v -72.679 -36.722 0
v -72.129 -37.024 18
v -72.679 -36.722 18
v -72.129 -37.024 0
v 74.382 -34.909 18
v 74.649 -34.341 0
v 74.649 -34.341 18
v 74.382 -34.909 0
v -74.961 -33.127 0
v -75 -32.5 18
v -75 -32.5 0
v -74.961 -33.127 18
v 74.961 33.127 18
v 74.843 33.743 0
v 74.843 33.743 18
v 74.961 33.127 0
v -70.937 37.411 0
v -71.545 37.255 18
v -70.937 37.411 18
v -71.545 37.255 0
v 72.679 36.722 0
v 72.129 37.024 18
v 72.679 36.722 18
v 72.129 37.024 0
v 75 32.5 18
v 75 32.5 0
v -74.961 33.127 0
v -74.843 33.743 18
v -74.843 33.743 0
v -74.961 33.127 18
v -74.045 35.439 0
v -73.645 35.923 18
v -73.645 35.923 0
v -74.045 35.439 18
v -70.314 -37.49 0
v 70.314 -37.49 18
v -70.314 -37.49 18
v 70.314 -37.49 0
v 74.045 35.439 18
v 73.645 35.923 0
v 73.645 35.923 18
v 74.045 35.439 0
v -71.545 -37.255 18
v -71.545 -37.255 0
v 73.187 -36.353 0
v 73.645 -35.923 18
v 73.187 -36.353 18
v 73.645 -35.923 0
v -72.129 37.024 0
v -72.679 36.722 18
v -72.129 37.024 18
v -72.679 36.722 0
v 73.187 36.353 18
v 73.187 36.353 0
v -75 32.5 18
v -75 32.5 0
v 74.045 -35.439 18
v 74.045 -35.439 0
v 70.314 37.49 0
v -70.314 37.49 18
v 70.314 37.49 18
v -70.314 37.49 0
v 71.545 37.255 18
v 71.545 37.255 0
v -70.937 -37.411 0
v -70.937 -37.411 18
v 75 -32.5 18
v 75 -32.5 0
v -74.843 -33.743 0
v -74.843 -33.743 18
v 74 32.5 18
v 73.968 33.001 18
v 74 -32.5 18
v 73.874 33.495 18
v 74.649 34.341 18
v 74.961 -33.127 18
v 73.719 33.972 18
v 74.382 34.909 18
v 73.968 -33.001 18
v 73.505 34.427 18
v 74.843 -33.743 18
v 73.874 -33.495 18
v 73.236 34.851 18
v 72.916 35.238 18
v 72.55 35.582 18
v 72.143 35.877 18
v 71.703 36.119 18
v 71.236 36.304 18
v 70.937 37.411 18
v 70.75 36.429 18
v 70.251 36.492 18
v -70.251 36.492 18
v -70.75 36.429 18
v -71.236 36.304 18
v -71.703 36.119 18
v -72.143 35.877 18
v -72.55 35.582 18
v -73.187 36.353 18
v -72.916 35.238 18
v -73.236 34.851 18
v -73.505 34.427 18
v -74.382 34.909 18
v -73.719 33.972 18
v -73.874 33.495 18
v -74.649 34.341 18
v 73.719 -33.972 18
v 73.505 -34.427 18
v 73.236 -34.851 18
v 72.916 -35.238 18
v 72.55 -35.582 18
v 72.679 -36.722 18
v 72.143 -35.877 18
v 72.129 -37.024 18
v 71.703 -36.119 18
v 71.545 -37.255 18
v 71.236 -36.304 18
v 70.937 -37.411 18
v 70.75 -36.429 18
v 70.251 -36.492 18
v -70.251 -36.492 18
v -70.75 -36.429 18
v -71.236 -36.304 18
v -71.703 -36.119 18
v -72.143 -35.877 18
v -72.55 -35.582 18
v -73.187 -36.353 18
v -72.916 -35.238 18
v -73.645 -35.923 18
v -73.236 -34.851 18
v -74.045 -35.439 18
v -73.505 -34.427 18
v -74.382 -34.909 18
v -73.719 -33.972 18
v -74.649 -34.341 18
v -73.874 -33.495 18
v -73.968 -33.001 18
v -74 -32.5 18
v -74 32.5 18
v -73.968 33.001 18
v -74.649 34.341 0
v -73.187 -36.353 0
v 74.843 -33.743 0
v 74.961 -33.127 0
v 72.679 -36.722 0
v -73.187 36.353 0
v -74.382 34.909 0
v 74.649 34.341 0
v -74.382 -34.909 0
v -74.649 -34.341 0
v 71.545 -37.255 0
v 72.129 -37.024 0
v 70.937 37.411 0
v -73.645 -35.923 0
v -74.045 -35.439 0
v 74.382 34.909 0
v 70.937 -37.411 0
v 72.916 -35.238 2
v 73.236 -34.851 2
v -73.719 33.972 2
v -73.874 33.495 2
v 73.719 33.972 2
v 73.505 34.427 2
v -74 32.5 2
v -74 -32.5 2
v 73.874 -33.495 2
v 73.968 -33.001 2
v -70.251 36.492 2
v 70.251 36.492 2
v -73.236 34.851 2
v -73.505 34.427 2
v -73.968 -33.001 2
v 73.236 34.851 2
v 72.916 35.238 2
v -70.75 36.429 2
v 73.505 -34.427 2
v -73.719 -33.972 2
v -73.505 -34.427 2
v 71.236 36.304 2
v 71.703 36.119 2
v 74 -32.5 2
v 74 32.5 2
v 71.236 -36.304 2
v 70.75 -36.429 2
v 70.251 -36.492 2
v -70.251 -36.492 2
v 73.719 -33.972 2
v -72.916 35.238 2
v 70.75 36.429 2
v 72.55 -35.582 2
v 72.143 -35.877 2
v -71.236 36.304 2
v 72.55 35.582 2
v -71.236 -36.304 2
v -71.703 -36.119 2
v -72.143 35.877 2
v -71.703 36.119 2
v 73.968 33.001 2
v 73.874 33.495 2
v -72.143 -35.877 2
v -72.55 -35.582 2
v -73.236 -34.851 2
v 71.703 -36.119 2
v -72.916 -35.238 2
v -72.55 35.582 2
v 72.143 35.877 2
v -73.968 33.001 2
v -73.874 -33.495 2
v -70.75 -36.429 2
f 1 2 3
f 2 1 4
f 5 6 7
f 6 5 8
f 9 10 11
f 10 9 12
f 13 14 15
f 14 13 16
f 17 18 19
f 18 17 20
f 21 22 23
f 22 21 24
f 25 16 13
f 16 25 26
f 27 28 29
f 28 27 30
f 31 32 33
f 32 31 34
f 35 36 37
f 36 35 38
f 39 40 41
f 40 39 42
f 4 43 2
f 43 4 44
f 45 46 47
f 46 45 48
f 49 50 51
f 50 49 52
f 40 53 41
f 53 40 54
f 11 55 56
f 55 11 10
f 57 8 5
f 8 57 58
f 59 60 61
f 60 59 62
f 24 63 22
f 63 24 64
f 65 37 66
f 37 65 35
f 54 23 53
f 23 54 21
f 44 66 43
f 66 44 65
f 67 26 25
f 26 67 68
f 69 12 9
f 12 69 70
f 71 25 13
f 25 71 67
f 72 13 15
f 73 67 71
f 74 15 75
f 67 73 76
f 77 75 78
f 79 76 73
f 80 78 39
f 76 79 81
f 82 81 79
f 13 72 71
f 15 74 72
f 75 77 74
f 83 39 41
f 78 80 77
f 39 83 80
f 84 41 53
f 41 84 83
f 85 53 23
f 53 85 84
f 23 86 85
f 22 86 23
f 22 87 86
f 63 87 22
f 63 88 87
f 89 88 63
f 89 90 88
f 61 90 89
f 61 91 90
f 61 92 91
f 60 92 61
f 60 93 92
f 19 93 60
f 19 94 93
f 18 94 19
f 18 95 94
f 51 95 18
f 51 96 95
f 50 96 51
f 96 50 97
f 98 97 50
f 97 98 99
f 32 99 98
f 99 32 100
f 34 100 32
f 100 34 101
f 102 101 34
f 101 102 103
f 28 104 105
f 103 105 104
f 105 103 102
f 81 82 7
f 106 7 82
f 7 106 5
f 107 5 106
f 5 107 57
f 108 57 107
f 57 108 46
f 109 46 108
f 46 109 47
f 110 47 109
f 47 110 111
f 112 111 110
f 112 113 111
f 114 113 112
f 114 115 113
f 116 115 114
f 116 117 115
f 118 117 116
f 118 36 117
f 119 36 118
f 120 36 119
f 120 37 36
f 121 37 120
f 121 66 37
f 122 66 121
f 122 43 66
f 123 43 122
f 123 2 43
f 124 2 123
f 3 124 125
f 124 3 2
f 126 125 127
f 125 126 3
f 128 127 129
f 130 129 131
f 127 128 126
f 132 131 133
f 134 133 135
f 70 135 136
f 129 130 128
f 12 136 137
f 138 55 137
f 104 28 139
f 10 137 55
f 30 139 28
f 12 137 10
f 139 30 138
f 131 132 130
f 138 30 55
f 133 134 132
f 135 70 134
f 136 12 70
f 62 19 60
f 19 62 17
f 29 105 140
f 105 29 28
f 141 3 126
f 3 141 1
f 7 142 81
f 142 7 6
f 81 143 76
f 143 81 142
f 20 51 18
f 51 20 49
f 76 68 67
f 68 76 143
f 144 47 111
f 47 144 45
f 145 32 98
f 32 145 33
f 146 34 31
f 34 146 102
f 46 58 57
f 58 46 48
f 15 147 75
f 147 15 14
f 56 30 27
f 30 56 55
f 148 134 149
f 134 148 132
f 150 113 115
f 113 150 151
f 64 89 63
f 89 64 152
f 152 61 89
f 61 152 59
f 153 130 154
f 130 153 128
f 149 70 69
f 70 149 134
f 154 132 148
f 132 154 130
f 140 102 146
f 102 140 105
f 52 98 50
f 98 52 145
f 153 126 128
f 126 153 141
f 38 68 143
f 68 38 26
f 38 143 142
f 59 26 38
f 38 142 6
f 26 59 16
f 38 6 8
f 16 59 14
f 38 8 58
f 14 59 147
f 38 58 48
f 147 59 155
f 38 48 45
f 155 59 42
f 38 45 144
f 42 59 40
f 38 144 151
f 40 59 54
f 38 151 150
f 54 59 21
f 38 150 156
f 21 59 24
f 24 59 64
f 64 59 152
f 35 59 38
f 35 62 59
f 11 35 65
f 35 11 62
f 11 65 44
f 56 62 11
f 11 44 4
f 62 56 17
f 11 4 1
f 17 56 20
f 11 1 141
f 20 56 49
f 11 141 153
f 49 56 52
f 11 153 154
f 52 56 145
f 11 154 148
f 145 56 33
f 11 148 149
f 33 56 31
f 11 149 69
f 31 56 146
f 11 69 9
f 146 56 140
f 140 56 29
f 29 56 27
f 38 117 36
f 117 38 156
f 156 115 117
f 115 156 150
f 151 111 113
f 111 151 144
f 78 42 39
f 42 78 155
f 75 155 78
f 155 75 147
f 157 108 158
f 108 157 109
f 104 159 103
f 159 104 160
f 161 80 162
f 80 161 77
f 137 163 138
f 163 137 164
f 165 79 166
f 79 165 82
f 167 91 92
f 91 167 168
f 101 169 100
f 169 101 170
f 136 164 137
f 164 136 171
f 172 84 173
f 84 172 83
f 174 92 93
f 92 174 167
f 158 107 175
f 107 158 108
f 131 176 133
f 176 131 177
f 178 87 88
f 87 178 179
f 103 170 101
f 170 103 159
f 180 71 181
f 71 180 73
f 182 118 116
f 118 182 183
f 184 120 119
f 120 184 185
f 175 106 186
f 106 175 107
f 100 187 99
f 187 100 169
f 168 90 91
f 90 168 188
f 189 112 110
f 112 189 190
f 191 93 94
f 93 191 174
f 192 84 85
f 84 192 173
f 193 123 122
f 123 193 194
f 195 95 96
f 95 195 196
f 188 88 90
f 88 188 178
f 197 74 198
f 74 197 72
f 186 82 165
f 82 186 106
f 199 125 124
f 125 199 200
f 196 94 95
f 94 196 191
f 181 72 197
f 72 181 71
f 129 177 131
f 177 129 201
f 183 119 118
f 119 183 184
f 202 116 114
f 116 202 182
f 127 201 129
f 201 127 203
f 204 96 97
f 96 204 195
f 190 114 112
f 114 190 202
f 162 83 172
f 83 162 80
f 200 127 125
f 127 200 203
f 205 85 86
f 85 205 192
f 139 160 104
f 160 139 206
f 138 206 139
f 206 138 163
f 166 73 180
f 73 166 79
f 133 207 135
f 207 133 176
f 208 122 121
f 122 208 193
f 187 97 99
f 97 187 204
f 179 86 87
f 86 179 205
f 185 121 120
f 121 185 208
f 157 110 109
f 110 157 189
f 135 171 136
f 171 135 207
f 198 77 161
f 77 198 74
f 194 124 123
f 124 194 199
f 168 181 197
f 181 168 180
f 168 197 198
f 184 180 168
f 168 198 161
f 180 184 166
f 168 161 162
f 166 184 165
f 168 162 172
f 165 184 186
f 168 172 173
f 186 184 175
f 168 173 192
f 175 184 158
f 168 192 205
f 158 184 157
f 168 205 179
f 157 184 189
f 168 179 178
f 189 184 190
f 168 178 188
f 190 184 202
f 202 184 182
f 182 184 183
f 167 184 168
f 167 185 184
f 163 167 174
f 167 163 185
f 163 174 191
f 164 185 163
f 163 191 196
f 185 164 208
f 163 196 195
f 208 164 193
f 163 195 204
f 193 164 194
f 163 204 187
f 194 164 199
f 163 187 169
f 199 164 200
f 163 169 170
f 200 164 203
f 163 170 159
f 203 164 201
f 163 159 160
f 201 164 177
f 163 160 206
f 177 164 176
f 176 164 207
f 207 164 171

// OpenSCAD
$fn = 50;


difference() {
	union() {
		hull() {
			translate(v = [-70.0000000000, 32.5000000000, 0]) {
				cylinder(h = 18, r = 5);
			}
			translate(v = [70.0000000000, 32.5000000000, 0]) {
				cylinder(h = 18, r = 5);
			}
			translate(v = [-70.0000000000, -32.5000000000, 0]) {
				cylinder(h = 18, r = 5);
			}
			translate(v = [70.0000000000, -32.5000000000, 0]) {
				cylinder(h = 18, r = 5);
			}
		}
	}
	union() {
		translate(v = [0, 0, 2]) {
			hull() {
				translate(v = [-70.0000000000, 32.5000000000, 0]) {
					cylinder(h = 16, r = 4);
				}
				translate(v = [70.0000000000, 32.5000000000, 0]) {
					cylinder(h = 16, r = 4);
				}
				translate(v = [-70.0000000000, -32.5000000000, 0]) {
					cylinder(h = 16, r = 4);
				}
				translate(v = [70.0000000000, -32.5000000000, 0]) {
					cylinder(h = 16, r = 4);
				}
			}
		}
	}
}
